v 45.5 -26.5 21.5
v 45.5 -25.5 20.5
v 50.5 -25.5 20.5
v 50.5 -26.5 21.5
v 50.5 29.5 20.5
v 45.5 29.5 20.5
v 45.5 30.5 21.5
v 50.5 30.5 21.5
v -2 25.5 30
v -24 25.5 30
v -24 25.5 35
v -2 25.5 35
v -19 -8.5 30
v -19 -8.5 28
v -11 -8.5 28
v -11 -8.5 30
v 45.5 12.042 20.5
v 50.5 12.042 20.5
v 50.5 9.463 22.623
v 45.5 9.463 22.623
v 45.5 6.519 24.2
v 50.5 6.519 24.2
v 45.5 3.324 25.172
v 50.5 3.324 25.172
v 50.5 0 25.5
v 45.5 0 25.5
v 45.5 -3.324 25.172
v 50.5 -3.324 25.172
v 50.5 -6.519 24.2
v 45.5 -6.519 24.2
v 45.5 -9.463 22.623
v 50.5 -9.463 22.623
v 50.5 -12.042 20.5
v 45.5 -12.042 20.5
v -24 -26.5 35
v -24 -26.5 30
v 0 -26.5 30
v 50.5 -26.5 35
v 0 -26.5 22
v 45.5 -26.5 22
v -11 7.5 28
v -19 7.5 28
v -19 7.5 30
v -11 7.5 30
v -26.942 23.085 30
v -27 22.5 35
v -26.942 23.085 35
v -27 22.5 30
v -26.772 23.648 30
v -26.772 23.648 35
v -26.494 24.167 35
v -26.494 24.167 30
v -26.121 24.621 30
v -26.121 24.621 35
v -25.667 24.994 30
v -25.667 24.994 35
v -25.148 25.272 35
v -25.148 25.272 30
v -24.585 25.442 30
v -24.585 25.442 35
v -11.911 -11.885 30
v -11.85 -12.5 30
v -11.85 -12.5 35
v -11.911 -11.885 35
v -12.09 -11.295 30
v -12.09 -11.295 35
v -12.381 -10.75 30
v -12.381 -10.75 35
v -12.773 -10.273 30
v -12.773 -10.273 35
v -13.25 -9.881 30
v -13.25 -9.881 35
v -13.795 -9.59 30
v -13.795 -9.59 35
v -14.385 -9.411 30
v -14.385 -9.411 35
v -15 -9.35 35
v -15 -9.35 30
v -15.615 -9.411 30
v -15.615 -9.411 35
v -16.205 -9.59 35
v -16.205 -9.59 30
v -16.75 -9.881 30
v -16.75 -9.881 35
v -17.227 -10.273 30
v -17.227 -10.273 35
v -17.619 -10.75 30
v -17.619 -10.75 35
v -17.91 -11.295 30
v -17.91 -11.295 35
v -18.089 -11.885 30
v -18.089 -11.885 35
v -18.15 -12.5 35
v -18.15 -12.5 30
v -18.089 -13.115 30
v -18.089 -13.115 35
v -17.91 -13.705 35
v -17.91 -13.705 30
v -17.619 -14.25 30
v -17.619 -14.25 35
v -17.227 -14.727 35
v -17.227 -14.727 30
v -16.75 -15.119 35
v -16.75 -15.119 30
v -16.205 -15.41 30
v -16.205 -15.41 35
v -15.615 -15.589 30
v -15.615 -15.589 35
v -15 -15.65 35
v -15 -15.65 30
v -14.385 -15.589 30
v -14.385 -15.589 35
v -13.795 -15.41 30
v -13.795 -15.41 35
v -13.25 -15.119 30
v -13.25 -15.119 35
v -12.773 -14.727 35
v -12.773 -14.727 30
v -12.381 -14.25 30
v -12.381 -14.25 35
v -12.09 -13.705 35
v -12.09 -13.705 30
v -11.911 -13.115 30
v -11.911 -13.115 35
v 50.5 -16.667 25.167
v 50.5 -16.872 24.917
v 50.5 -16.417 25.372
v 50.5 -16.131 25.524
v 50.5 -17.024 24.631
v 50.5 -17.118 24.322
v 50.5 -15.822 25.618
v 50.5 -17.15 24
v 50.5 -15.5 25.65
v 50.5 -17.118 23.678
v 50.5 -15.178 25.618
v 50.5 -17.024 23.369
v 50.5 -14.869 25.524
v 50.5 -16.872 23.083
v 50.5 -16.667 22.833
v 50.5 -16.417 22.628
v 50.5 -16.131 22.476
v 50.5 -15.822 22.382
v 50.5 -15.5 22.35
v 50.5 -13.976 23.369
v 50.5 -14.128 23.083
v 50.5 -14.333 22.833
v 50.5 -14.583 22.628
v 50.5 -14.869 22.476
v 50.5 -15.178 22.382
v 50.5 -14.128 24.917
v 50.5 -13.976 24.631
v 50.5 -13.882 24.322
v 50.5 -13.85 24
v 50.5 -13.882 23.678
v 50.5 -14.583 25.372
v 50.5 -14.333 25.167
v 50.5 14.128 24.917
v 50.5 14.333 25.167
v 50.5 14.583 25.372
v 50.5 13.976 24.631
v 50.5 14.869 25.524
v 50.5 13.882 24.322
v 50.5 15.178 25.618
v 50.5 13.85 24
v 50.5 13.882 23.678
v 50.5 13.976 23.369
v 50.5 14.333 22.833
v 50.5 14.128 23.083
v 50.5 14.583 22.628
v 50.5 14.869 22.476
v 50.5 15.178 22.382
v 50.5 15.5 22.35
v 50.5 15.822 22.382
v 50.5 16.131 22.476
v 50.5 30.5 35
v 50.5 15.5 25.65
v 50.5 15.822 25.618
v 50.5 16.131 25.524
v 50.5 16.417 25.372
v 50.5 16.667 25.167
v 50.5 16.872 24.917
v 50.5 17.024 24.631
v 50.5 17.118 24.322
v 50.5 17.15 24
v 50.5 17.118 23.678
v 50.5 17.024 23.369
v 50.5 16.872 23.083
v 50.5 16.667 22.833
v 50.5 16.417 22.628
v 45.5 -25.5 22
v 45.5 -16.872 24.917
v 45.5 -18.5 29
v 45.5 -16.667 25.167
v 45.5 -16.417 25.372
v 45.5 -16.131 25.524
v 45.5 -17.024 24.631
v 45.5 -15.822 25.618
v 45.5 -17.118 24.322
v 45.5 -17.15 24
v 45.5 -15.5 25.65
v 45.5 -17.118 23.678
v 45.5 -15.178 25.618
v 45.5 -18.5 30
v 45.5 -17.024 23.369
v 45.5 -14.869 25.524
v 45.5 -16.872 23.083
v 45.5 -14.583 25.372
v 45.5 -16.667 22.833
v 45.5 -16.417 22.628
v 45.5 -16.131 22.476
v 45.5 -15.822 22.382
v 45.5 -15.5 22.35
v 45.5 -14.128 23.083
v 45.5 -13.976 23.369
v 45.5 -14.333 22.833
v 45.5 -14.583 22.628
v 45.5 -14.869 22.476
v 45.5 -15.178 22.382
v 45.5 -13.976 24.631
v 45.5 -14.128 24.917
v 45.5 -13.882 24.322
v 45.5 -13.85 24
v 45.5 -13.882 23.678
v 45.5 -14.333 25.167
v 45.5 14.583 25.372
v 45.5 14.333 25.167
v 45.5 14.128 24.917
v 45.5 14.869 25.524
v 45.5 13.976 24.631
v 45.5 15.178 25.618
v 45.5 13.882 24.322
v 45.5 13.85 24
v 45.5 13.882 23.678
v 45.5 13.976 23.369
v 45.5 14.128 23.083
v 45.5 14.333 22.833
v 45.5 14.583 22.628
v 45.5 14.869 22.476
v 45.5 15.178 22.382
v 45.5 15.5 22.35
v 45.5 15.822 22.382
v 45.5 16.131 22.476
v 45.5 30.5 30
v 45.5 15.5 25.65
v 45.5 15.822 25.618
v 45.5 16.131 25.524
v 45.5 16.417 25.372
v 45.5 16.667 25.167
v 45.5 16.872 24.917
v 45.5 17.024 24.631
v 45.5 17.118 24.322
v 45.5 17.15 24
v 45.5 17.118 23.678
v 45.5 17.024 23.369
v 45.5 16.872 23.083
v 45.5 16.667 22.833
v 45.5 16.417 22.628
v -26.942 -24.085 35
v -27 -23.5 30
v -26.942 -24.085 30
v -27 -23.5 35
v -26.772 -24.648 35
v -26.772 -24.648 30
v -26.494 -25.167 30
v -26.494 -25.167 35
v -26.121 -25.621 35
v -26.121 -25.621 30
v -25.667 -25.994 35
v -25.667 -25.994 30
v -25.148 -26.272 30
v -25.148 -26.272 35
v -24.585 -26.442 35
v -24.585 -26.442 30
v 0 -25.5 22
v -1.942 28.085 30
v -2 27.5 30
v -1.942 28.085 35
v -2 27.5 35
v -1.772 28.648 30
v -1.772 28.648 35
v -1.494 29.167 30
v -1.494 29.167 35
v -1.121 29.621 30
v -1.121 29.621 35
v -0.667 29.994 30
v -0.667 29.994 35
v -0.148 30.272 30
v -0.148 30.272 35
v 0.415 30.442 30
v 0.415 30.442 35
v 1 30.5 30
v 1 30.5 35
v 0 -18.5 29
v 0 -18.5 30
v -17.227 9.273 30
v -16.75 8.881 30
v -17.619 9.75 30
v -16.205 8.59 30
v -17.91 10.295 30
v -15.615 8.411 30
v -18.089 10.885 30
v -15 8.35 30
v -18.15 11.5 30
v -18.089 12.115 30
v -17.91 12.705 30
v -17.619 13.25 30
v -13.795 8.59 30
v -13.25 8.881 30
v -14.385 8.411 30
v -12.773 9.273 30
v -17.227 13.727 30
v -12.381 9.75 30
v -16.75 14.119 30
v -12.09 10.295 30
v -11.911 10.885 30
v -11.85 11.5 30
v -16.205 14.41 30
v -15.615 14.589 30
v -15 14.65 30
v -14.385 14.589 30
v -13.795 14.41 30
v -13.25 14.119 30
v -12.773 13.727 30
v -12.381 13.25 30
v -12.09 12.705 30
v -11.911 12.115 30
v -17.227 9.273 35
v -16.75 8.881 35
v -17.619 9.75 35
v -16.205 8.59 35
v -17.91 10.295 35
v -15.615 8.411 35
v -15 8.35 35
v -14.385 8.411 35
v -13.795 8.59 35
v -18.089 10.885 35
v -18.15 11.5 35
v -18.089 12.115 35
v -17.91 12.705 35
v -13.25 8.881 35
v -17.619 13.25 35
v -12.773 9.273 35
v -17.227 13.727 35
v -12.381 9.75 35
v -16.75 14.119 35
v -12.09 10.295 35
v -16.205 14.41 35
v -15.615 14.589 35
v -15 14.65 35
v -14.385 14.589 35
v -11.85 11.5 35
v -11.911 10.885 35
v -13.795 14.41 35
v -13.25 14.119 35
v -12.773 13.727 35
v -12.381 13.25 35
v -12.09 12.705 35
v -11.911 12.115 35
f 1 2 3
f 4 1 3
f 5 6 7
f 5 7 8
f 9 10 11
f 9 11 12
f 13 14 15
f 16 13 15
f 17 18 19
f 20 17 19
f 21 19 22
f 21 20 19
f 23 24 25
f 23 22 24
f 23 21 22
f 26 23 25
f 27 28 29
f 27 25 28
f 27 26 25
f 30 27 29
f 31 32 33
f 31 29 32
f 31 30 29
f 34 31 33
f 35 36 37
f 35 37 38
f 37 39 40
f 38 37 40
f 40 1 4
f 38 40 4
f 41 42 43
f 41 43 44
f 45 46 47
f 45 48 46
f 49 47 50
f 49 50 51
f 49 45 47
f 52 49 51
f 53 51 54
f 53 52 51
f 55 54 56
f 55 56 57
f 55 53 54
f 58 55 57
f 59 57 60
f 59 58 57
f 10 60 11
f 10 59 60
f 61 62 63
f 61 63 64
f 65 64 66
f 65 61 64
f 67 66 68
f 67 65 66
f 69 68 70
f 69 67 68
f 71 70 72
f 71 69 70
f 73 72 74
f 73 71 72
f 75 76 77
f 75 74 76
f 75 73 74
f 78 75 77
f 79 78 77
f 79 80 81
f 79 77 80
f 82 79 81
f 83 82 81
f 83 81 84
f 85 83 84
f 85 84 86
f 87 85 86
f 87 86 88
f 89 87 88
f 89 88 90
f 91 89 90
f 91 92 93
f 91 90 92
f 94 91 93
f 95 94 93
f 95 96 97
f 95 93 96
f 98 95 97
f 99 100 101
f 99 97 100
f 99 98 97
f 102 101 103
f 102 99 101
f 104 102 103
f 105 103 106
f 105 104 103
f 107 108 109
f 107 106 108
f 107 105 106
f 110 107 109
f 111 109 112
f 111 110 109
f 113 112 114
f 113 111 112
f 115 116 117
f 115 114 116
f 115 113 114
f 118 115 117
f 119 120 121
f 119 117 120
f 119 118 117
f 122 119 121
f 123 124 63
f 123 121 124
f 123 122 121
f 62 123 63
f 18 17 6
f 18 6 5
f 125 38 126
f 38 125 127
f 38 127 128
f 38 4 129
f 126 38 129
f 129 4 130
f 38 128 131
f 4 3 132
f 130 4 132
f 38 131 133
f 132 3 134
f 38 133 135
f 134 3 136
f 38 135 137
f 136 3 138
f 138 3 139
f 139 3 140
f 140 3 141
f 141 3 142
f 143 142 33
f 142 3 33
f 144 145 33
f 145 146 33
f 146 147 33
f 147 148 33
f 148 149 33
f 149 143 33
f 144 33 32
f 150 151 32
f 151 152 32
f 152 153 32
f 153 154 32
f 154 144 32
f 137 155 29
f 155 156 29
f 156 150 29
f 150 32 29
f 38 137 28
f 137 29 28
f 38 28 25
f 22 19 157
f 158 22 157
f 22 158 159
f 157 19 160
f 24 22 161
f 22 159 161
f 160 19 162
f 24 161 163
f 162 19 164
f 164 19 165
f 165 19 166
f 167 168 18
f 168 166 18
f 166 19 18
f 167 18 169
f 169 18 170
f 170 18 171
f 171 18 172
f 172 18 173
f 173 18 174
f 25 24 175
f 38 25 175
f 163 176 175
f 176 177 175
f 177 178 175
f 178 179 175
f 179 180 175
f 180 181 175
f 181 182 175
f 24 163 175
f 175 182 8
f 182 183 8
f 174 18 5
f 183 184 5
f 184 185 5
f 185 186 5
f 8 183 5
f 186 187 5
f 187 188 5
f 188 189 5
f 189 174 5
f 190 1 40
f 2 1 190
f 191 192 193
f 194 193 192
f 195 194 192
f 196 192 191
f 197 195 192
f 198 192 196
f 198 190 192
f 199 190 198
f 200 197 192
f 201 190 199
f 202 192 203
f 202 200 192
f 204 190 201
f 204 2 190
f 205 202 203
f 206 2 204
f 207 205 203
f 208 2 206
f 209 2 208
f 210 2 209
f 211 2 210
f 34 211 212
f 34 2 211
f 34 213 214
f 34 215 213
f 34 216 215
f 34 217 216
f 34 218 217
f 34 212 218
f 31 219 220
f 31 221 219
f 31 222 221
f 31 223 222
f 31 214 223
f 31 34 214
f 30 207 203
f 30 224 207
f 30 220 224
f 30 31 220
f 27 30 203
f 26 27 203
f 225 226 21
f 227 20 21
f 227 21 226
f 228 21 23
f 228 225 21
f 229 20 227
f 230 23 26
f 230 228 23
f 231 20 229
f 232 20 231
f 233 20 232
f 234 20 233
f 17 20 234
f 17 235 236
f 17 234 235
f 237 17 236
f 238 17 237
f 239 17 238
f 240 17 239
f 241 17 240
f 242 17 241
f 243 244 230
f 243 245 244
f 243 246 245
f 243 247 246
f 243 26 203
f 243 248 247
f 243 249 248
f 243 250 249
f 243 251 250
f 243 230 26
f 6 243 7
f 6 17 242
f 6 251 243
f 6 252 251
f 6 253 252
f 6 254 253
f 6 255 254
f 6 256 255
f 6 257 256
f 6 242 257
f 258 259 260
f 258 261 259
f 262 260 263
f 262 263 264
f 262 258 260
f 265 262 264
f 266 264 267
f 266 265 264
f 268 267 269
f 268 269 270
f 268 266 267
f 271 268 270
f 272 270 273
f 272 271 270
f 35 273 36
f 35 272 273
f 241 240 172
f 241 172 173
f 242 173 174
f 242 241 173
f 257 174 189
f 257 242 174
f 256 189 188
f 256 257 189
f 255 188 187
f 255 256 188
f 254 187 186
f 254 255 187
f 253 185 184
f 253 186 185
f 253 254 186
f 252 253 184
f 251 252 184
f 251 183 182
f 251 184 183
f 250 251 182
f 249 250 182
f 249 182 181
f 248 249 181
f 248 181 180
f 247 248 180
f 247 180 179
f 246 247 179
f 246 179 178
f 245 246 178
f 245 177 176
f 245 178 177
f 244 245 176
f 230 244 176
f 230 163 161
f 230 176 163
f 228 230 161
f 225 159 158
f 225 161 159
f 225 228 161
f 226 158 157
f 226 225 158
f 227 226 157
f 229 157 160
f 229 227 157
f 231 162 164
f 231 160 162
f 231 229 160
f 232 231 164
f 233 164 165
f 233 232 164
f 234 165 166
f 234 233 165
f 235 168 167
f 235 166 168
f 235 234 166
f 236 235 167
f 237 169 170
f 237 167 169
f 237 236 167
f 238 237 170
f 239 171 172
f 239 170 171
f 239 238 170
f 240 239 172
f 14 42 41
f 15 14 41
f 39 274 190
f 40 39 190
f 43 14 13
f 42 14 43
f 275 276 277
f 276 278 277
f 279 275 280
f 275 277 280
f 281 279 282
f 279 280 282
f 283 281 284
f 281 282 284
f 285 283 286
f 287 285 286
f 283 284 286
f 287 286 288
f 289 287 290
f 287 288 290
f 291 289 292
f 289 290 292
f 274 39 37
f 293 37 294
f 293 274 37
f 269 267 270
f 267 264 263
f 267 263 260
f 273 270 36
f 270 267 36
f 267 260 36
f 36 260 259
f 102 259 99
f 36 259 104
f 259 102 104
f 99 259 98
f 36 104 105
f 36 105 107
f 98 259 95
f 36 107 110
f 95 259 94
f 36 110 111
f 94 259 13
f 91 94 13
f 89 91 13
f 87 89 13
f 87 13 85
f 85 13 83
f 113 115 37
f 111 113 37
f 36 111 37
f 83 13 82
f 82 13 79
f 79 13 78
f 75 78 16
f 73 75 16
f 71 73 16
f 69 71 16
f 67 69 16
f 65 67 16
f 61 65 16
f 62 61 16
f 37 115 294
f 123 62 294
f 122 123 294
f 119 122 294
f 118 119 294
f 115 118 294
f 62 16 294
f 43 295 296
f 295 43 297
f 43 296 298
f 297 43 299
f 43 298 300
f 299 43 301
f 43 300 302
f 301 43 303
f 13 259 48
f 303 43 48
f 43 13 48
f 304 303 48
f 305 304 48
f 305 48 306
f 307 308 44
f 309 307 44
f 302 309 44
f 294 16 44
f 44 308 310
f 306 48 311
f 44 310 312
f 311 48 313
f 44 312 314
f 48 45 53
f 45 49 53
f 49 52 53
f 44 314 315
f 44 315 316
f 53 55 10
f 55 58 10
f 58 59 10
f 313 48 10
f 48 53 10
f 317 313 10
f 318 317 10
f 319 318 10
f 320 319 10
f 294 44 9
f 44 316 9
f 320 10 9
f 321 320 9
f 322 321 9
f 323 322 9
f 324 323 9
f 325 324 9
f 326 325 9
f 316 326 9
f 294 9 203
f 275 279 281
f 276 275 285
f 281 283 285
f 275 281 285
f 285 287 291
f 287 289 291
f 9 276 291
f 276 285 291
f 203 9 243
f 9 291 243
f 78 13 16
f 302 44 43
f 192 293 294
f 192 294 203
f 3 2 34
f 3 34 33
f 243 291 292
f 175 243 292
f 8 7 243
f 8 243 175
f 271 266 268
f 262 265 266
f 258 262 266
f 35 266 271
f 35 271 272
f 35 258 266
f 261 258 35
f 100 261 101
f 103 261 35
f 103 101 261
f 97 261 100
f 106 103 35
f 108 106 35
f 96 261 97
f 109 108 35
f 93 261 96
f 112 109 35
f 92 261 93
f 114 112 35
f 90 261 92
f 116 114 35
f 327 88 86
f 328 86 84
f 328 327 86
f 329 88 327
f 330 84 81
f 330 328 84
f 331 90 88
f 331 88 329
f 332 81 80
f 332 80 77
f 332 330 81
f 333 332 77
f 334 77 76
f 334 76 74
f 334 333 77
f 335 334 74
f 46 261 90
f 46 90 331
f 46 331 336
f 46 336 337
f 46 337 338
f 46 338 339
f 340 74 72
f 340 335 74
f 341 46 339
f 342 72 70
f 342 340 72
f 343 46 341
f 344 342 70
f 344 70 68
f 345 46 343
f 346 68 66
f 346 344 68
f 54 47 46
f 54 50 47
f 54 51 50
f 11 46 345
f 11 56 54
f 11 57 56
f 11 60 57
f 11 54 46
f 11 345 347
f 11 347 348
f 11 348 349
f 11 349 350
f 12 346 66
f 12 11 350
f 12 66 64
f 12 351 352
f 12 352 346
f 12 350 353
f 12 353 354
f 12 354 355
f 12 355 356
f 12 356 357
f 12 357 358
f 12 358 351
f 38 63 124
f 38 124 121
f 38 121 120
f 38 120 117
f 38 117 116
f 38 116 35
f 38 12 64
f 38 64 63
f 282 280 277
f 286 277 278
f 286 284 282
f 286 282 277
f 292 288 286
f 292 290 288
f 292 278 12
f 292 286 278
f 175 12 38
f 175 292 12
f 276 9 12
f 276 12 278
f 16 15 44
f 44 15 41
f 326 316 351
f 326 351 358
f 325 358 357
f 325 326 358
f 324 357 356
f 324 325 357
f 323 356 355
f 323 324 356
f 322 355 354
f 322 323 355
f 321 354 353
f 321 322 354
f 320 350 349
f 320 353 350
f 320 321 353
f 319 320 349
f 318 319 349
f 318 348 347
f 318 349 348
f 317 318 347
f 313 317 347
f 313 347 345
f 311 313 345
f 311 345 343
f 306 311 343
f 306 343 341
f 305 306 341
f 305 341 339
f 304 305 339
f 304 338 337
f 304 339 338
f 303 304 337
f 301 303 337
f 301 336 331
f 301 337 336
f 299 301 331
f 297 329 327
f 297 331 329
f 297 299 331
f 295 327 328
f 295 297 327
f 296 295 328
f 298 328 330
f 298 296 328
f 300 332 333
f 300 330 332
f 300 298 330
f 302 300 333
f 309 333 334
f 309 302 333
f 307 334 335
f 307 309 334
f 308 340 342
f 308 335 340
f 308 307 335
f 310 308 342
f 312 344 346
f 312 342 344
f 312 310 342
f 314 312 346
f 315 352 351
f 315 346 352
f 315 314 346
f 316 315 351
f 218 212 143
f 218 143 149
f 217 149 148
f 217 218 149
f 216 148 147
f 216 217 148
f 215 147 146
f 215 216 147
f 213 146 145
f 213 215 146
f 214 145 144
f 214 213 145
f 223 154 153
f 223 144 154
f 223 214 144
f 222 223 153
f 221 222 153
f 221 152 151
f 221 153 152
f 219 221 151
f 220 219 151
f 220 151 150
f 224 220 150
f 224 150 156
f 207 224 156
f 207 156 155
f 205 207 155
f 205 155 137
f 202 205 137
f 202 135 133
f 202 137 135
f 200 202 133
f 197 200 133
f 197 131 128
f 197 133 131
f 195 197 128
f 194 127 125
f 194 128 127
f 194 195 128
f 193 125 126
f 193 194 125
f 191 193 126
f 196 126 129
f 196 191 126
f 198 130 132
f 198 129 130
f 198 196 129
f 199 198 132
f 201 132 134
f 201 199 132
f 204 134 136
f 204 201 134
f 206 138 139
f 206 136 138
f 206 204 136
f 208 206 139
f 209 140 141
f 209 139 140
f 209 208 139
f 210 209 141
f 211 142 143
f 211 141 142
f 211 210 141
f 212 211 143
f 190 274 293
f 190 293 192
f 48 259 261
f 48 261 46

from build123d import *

# Parameters (mm, degrees)
CYLINDER026_R     = 3.15
CYLINDER026_DEPTH = 10
CYLINDER027_R     = 3.15
CYLINDER027_DEPTH = 10
CYLINDER028_R     = 1.65
CYLINDER028_DEPTH = 83
CYLINDER029_R     = 1.65
CYLINDER029_DEPTH = 83
BOX022_W          = 50.5
BOX022_H          = 8
BOX022_DEPTH      = 9
CHAMFER026_SIZE   = 7
CYLINDER025_R     = 17
CYLINDER025_DEPTH = 83
BOX021_W          = 5
BOX021_H          = 57
BOX021_DEPTH      = 10
CHAMFER027_SIZE   = 1
BOX024_W          = 8
BOX024_H          = 16
BOX024_DEPTH      = 2
BOX036_W          = 28
BOX036_H          = 14
BOX036_DEPTH      = 10
BOX023_W          = 77.5
BOX023_H          = 57
BOX023_DEPTH      = 5
FILLET002_R       = 3


with BuildPart() as cylinder012:
    # Cylinder026 → Cylinder026 (new body)
    with BuildSketch(Plane(origin=(-15, 11.5, 26), x_dir=(1, 0, 0), z_dir=(0, 0, 1))):
        Circle(CYLINDER026_R)
    extrude(amount=CYLINDER026_DEPTH)


with BuildPart() as fusion006002011004053036004001028003008:
    # Cylinder027 → Cylinder027 (new body)
    with BuildSketch(Plane(origin=(-15, -12.5, 26), x_dir=(1, 0, 0), z_dir=(0, 0, 1))):
        Circle(CYLINDER027_R)
    extrude(amount=CYLINDER027_DEPTH)

    # Fusion006002011004053036004001028003008: union Cylinder012
    add(cylinder012.part)


with BuildPart() as posa007:
    # Cylinder028 → Cylinder028 (new body)
    with BuildSketch(Plane(origin=(25.5, -15.5, 24), x_dir=(0, 0, -1), z_dir=(1, 0, 0))):
        Circle(CYLINDER028_R)
    extrude(amount=CYLINDER028_DEPTH)


with BuildPart() as fusion006002011004053036004001024:
    # Cylinder029 → Cylinder029 (new body)
    with BuildSketch(Plane(origin=(25.5, 15.5, 24), x_dir=(0, 0, -1), z_dir=(1, 0, 0))):
        Circle(CYLINDER029_R)
    extrude(amount=CYLINDER029_DEPTH)

    # Fusion006002011004053036004001024: union POSA007
    add(posa007.part)


with BuildPart() as chamfer026:
    # Box022 → Box022 (new body)
    with BuildSketch(Plane(origin=(0, -26.5, 22), x_dir=(1, 0, 0), z_dir=(0, 0, 1))):
        with Locations((25.25, 4)):
            Rectangle(BOX022_W, BOX022_H)
    extrude(amount=BOX022_DEPTH)

    # Chamfer026
    chamfer026_edges = [chamfer026.edges().sort_by_distance(p)[0] for p in [
        (25.25, -18.5, 22),
    ]]
    chamfer(chamfer026_edges, length=CHAMFER026_SIZE)


with BuildPart() as posa006:
    # Cylinder025 → Cylinder025 (new body)
    with BuildSketch(Plane(origin=(18.5, 0, 8.5), x_dir=(0, 0, -1), z_dir=(1, 0, 0))):
        Circle(CYLINDER025_R)
    extrude(amount=CYLINDER025_DEPTH)


with BuildPart() as cut001022:
    # Box021 → Box021 (new body)
    with BuildSketch(Plane(origin=(45.5, -26.5, 20.5), x_dir=(1, 0, 0), z_dir=(0, 0, 1))):
        with Locations((2.5, 28.5)):
            Rectangle(BOX021_W, BOX021_H)
    extrude(amount=BOX021_DEPTH)

    # Chamfer027
    chamfer027_edges = [cut001022.edges().sort_by_distance(p)[0] for p in [
        (48, -26.5, 20.5),
        (48, 30.5, 20.5),
    ]]
    chamfer(chamfer027_edges, length=CHAMFER027_SIZE)

    # Cut001022: cut POSA006
    add(posa006.part, mode=Mode.SUBTRACT)


with BuildPart() as cube024:
    # Box024 → Box024 (new body)
    with BuildSketch(Plane(origin=(-19, -8.5, 28), x_dir=(1, 0, 0), z_dir=(0, 0, 1))):
        with Locations((4, 8)):
            Rectangle(BOX024_W, BOX024_H)
    extrude(amount=BOX024_DEPTH)


with BuildPart() as cube036:
    # Box036 → Box036 (new body)
    with BuildSketch(Plane(origin=(-30, 25.5, 25), x_dir=(1, 0, 0), z_dir=(0, 0, 1))):
        with Locations((14, 7)):
            Rectangle(BOX036_W, BOX036_H)
    extrude(amount=BOX036_DEPTH)


with BuildPart() as cut001024014:
    # Box023 → Box023 (new body)
    with BuildSketch(Plane(origin=(-27, -26.5, 30), x_dir=(1, 0, 0), z_dir=(0, 0, 1))):
        with Locations((38.75, 28.5)):
            Rectangle(BOX023_W, BOX023_H)
    extrude(amount=BOX023_DEPTH)

    # Cut001024012: cut Cube036
    add(cube036.part, mode=Mode.SUBTRACT)

    # Fillet002
    fillet002_edges = [cut001024014.edges().sort_by_distance(p)[0] for p in [
        (-27, 25.5, 32.5),
        (-27, -26.5, 32.5),
        (-2, 30.5, 32.5),
    ]]
    fillet(fillet002_edges, radius=FILLET002_R)

    # Fusion006002011004053036004001028003007: union Chamfer026, Cut001022, Cube024
    add(chamfer026.part)
    add(cut001022.part)
    add(cube024.part)

    # Cut001024013: cut Fusion006002011004053036004001024
    add(fusion006002011004053036004001024.part, mode=Mode.SUBTRACT)

    # Cut001024014: cut Fusion006002011004053036004001028003008
    add(fusion006002011004053036004001028003008.part, mode=Mode.SUBTRACT)


solid = cut001024014.part
